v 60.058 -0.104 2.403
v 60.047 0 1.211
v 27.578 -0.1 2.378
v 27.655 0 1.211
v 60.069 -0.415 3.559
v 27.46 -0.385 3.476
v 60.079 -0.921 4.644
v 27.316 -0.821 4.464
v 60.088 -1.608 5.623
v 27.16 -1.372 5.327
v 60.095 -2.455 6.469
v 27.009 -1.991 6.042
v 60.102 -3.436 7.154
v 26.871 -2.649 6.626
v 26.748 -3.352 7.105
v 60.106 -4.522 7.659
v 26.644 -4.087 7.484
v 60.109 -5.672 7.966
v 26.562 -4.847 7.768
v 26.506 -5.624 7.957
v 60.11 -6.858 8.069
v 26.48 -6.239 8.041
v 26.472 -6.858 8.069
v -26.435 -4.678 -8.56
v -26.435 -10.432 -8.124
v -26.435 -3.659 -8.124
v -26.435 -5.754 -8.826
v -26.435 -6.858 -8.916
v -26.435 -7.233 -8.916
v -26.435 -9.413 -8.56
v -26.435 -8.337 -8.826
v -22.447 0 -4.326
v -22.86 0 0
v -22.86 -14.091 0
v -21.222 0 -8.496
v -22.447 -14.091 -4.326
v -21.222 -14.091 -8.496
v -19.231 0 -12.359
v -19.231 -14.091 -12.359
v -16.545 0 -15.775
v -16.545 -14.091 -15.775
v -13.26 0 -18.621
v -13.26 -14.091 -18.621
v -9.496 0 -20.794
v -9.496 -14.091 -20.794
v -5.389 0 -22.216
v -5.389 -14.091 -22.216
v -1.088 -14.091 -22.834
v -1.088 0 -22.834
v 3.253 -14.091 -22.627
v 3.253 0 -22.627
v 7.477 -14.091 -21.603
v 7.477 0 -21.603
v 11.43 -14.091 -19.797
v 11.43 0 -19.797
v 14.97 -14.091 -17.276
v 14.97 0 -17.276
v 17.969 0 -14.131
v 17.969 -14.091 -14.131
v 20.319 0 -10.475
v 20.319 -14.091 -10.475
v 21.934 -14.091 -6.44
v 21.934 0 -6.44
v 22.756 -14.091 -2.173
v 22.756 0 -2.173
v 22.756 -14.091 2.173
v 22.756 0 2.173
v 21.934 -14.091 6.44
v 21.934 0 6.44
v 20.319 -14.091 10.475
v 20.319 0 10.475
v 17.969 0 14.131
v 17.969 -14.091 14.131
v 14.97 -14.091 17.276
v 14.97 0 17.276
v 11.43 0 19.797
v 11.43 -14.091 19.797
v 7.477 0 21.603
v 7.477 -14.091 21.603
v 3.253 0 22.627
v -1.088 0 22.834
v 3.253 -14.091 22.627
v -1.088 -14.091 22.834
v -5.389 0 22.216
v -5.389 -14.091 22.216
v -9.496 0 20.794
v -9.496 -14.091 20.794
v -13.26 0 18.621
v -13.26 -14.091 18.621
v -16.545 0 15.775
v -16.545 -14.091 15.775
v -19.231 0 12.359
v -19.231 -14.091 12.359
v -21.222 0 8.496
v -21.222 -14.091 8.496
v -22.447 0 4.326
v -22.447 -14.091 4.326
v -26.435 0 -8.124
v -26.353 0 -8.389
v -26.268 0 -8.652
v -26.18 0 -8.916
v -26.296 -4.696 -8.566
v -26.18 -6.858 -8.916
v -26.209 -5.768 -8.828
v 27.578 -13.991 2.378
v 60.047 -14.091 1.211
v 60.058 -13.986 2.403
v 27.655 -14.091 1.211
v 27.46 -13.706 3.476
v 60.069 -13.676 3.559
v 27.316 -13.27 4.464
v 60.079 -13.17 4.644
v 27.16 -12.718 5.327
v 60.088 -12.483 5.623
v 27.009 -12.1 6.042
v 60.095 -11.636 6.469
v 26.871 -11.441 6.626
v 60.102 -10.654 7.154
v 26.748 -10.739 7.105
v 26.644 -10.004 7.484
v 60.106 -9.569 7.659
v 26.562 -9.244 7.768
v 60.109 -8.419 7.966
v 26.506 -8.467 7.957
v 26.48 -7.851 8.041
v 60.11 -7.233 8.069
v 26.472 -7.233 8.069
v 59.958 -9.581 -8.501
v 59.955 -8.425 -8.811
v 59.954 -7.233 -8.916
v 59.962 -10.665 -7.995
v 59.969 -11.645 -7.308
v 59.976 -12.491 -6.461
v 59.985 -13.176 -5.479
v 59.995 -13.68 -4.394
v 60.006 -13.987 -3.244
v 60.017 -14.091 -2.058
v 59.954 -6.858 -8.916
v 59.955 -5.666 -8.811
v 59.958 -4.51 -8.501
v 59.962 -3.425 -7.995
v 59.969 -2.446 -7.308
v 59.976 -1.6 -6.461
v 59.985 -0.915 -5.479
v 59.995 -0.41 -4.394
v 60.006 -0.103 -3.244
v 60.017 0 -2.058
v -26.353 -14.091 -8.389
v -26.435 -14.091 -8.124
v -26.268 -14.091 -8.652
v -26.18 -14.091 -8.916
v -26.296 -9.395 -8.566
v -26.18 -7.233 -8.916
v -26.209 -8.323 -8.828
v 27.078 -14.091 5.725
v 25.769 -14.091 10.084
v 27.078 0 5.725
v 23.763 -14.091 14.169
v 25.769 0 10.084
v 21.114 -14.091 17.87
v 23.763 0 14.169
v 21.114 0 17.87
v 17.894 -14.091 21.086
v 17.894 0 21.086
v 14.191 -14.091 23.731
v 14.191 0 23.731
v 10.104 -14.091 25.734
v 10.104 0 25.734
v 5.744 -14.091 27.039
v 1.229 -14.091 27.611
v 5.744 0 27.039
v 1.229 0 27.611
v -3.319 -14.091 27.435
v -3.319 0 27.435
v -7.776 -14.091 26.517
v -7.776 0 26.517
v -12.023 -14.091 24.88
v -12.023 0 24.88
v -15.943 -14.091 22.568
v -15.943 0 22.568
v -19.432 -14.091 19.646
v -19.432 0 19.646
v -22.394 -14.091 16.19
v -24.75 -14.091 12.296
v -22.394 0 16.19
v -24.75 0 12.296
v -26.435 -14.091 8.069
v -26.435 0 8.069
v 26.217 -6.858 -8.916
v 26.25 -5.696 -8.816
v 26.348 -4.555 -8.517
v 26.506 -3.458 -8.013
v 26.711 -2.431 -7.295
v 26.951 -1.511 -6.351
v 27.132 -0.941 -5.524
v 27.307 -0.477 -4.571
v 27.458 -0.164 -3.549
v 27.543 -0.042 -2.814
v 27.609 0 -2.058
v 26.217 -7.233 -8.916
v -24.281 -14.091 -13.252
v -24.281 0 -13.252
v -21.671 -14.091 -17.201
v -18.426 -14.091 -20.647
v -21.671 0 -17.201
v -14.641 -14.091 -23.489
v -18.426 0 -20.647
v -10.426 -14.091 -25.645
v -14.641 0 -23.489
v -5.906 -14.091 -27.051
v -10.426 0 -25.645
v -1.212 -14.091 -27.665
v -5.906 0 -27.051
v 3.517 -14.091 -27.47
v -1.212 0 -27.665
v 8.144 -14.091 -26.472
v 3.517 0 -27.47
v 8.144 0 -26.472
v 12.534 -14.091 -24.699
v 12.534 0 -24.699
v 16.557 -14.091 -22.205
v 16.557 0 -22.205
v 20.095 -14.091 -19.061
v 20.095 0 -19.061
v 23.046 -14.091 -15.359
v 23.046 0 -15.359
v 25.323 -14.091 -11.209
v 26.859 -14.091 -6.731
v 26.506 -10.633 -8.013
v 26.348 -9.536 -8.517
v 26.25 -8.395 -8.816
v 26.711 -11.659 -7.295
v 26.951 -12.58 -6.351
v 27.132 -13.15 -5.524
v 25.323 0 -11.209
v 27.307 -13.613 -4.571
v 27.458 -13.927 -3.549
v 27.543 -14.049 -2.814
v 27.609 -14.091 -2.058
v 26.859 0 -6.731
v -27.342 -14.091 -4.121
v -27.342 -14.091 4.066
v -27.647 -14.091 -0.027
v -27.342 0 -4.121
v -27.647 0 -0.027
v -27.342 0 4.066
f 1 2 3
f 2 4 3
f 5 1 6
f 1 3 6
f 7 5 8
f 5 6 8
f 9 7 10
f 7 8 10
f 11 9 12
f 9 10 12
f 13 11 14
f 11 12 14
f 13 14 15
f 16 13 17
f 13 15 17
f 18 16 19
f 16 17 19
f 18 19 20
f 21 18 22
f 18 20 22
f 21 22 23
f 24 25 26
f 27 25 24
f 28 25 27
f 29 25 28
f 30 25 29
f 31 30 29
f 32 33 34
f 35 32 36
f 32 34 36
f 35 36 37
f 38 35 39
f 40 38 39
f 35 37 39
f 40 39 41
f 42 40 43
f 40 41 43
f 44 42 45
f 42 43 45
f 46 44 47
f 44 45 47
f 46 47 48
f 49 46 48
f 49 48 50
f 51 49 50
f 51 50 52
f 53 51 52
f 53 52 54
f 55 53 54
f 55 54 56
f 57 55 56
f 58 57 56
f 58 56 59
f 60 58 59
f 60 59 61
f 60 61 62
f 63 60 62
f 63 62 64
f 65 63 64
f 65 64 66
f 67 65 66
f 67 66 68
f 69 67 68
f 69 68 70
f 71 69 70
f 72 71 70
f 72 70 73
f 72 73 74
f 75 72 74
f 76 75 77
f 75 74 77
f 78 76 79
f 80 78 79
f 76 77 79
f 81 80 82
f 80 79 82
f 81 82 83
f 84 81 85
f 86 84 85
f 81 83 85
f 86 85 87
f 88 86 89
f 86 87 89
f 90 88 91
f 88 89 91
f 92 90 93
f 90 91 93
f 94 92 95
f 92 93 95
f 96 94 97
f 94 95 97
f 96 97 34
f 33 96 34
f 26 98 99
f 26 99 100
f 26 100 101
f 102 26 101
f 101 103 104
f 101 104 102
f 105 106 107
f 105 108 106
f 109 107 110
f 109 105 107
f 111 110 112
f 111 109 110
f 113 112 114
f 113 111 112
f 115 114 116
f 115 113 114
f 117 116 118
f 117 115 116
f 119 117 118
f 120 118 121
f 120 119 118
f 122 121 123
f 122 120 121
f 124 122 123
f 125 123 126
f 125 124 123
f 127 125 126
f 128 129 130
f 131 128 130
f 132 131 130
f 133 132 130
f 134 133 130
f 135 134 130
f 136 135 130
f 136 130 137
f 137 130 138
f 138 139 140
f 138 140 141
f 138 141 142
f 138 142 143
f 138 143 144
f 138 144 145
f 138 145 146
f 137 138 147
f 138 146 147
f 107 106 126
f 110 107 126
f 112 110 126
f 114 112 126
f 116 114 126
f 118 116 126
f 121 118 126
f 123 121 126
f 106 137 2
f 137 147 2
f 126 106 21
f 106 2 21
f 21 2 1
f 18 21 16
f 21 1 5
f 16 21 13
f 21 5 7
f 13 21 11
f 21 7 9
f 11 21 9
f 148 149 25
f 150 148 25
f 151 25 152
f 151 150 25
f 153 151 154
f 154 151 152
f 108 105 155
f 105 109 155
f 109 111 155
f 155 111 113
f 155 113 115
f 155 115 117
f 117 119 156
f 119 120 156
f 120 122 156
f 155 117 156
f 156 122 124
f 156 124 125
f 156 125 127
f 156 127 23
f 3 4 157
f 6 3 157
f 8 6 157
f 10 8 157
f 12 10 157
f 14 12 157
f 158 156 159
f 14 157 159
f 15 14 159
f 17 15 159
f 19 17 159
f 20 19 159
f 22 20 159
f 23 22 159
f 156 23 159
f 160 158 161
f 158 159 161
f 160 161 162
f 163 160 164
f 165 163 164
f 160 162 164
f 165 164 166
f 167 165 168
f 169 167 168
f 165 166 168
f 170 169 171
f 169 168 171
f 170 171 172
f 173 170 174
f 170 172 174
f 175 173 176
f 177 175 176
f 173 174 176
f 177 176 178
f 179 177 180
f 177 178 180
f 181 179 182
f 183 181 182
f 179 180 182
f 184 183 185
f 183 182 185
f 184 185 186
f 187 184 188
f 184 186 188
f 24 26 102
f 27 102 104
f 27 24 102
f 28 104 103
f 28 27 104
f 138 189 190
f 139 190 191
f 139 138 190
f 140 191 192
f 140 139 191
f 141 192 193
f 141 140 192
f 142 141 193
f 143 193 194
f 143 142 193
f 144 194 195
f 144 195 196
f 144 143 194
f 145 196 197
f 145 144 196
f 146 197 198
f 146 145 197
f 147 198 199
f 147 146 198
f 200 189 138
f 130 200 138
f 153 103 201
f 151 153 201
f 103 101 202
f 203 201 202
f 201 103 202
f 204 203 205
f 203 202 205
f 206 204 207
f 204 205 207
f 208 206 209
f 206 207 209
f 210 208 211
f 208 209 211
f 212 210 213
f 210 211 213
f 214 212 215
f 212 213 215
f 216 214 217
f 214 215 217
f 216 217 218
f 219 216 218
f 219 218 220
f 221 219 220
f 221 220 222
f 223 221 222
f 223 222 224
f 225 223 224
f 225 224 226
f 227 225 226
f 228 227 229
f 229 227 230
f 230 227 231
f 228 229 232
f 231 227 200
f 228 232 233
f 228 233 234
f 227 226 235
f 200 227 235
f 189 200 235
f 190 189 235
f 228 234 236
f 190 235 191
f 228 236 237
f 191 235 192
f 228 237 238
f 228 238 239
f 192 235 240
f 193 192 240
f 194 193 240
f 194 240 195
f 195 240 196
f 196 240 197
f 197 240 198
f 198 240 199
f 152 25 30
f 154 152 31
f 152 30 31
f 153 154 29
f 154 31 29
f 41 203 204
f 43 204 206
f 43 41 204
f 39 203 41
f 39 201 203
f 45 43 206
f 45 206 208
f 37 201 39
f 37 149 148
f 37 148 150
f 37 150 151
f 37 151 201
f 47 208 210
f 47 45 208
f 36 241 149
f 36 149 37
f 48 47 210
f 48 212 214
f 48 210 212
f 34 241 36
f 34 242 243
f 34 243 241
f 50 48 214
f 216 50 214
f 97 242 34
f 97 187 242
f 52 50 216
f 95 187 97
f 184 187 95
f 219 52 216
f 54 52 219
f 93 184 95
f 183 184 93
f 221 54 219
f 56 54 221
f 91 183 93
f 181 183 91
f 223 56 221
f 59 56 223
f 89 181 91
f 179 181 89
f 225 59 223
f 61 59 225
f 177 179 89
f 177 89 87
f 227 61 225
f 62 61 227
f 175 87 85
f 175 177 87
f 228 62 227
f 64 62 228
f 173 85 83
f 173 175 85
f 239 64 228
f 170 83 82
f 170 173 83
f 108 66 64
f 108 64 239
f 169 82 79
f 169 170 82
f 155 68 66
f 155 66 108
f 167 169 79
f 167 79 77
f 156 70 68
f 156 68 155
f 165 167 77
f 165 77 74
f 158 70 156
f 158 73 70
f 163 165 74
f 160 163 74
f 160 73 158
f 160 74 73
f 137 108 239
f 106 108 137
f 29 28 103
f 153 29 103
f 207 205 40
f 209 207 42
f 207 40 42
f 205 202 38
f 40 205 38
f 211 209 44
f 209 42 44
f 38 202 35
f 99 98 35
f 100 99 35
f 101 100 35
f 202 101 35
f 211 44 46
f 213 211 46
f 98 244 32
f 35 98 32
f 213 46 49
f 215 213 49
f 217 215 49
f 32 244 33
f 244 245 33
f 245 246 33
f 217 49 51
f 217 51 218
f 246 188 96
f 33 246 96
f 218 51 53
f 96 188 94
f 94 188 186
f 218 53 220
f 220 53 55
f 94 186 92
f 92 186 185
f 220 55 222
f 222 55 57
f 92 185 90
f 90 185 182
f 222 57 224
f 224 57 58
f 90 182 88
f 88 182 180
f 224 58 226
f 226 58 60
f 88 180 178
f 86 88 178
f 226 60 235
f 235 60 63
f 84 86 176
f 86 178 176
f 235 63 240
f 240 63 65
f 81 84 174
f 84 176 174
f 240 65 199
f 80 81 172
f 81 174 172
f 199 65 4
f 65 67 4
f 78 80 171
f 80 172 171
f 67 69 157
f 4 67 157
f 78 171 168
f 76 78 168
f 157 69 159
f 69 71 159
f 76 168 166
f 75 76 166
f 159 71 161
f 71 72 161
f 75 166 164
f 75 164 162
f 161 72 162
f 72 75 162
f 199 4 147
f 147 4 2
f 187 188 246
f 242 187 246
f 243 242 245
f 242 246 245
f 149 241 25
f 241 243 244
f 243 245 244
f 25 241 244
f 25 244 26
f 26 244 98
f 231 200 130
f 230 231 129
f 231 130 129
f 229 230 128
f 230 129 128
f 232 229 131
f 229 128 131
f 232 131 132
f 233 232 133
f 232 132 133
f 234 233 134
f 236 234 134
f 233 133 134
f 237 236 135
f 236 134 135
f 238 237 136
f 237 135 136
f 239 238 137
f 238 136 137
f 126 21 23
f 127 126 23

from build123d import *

# Parameters (mm, degrees)
F1_DEPTH     = 14.0906665474
F3_D         = 45.72
F4_R         = 6.858
F5_T4_DEPTH  = 103.1253973126
F5_S5_R      = 27.6648668559
F5_T6_DEPTH  = 53
F5_T10_DEPTH = 103.1253973126
F5_S11_R     = 27.6648668559
F5_T12_DEPTH = 53


# Not quite as in the source:
# - a fillet or chamfer that OpenCascade refuses, or shapes differently, is made with other operations: its cross-section is extruded or revolved along the edge and cut away or added


with BuildPart() as f1:
    # F0 (on Front) → F1 (new body)
    with BuildSketch(Plane.XZ):
        with BuildLine():
            ThreePointArc((26.2165333562, -8.9155114296), (27.3140546761, -4.5315667493), (27.6831785203, -0.0274273648))
            ThreePointArc((27.6831785203, -0.0274273648), (27.3786909177, 4.0657993906), (26.4719306688, 8.0689236483))
            Line((26.4719306688, 8.0689236483), (-26.4353073399, 8.0689236483))
            Line((-26.4353073399, 8.0689236483), (-26.4353073399, -8.1237783779))
            ThreePointArc((-26.4353073399, -8.1237783779), (-26.3105848654, -8.5206049607), (-26.1799100273, -8.9155114296))
            Line((-26.1799100273, -8.9155114296), (26.2165333562, -8.9155114296))
        make_face()
        with BuildLine():
            ThreePointArc((26.4719306688, 8.0689236483), (27.3786909177, 4.0657993906), (27.6831785203, -0.0274273648))
            ThreePointArc((27.6831785203, -0.0274273648), (27.3140546761, -4.5315667493), (26.2165333562, -8.9155114296))
            Line((26.2165333562, -8.9155114296), (59.9537639373, -8.9155114296))
            Line((59.9537639373, -8.9155114296), (60.1102084538, 8.0689236483))
            Line((60.1102084538, 8.0689236483), (26.4719306688, 8.0689236483))
        make_face()
        with BuildLine():
            Line((-26.4353073399, 8.0689236483), (26.4719306688, 8.0689236483))
            ThreePointArc((26.4719306688, 8.0689236483), (0.0183116645, 27.6374394911), (-26.4353073399, 8.0689236483))
        make_face()
        with BuildLine():
            ThreePointArc((-26.1799100273, -8.9155114296), (0.0183116645, -27.6922942207), (26.2165333562, -8.9155114296))
            Line((26.2165333562, -8.9155114296), (-26.1799100273, -8.9155114296))
        make_face()
        with BuildLine():
            Line((-26.4353073399, -8.1237783779), (-26.4353073399, 8.0689236483))
            ThreePointArc((-26.4353073399, 8.0689236483), (-27.6465551914, -0.0274273648), (-26.4353073399, -8.1237783779))
        make_face()
        with BuildLine():
            Line((-26.4353073399, -8.9155114296), (-26.1799100273, -8.9155114296))
            ThreePointArc((-26.1799100273, -8.9155114296), (-26.3105848654, -8.5206049607), (-26.4353073399, -8.1237783779))
            Line((-26.4353073399, -8.1237783779), (-26.4353073399, -8.9155114296))
        make_face()
    extrude(amount=F1_DEPTH)

    # F3 (through all)
    with Locations(Plane(origin=(0, 0, 0), x_dir=(1, 0, 0), z_dir=(0, 1, 0))):
        with Locations((0, 0)):
            Hole(F3_D / 2)

    # F4
    f4_edges = [f1.edges().sort_by_distance(p)[0] for p in [
        (43.085149, -14.090667, -8.915511),
        (43.085149, 0, -8.915511),
        (43.29107, -14.090667, 8.068924),
        (43.29107, 0, 8.068924),
    ]]
    fillet(f4_edges, radius=F4_R)

    # F5: fillet of radius 6.858 on 2 edges, made by hand


with BuildPart() as f5_tool2:
    # F5_s3 → F5_t4 (new body)
    with BuildSketch(Plane.YZ.offset(-43.5803073399)):
        with BuildLine():
            ThreePointArc((-14.0906665474, -2.0575114296), (-12.0820048528, -6.906849735), (-7.2326665474, -8.9155114296))
            Line((-7.2326665474, -8.9155114296), (-14.0906665474, -8.9155114296))
            Line((-14.0906665474, -8.9155114296), (-14.0906665474, -2.0575114296))
        make_face()
    extrude(amount=F5_T4_DEPTH)

    # F5_s5 → F5_t6 (cut, symmetric)
    with BuildSketch(Plane.XZ.offset(10.7)):
        with Locations((0.0183116645, -0.0274273648)):
            Circle(F5_S5_R)
    extrude(amount=F5_T6_DEPTH, both=True, mode=Mode.SUBTRACT)


with BuildPart() as f1_1:
    add(f1.part)

    # F5_t1: cut F5_tool2
    add(f5_tool2.part, mode=Mode.SUBTRACT)


with BuildPart() as f5_tool8:
    # F5_s9 → F5_t10 (new body)
    with BuildSketch(Plane.YZ.offset(-43.5803073399)):
        with BuildLine():
            ThreePointArc((0, -2.0575114296), (-2.0086616946, -6.906849735), (-6.858, -8.9155114296))
            Line((-6.858, -8.9155114296), (0, -8.9155114296))
            Line((0, -8.9155114296), (0, -2.0575114296))
        make_face()
    extrude(amount=F5_T10_DEPTH)

    # F5_s11 → F5_t12 (cut, symmetric)
    with BuildSketch(Plane.XZ.offset(3.4)):
        with Locations((0.0183116645, -0.0274273648)):
            Circle(F5_S11_R)
    extrude(amount=F5_T12_DEPTH, both=True, mode=Mode.SUBTRACT)


with BuildPart() as f1_2:
    add(f1_1.part)

    # F5_t7: cut F5_tool8
    add(f5_tool8.part, mode=Mode.SUBTRACT)


solid = f1_2.part
